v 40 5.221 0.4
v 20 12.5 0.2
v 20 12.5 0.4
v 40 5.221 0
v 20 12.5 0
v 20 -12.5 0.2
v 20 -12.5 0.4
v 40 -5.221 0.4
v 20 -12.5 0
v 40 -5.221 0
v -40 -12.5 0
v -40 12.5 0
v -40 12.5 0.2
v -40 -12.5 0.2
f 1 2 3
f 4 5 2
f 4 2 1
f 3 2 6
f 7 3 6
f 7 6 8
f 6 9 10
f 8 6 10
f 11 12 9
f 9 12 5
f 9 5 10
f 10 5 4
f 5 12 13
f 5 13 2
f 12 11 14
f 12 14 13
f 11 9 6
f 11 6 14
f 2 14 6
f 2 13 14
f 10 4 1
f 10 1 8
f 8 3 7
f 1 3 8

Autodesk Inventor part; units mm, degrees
ref_plane "YZ Plane" through (0, 0, 0) normal (1, 0, 0) x (0, 1, 0)
ref_plane "XZ Plane" through (0, 0, 0) normal (0, 1, 0) x (-1, 0, 0)
ref_plane "XY Plane" through (0, 0, 0) normal (0, 0, 1) x (1, 0, 0)
sketch "Sketch1" plane through (0, 0, 0) normal (0, 0, 1) x (1, 0, 0)
  line L0 (-40, 12.5) -> (40, 12.5)
  line L1 (40, 12.5) -> (40, -12.5)
  line L2 (40, -12.5) -> (-40, -12.5)
  line L3 (-40, -12.5) -> (-40, 12.5)
  line L4 (-58.4065, 0) -> (96.114, 0) construction
  line L5 (0, 47.121) -> (0, -49.5625) construction
  line L6 (20, 12.5) -> (20, -12.5)
  line L7 (20, 12.5) -> (40, 5.2206)
  line L8 (20, -12.5) -> (40, -5.2206)
  point P0 (0, 0)
  point P1 (0, 12.5)
  point P2 (40, 0)
  dimension "d0" = 80
  dimension "d1" = 25
  dimension "d11" = 20
  dimension "d16" = 70
  dimension "d17" = 70
extrude "Extrusion4" add sketch "Sketch1" along normal blind 0.2 contours L0 L6 L2 L3 | L7 L1 L8 L6
extrude "Extrusion5" add sketch "Sketch1" along normal blind 0.4 contours L7 L1 L8 L6
equation "\"d18\" = material"
equation "\"d20\" = 2 * material"
equation "\"material\" = 0.2"
properties part number "BandBack"
